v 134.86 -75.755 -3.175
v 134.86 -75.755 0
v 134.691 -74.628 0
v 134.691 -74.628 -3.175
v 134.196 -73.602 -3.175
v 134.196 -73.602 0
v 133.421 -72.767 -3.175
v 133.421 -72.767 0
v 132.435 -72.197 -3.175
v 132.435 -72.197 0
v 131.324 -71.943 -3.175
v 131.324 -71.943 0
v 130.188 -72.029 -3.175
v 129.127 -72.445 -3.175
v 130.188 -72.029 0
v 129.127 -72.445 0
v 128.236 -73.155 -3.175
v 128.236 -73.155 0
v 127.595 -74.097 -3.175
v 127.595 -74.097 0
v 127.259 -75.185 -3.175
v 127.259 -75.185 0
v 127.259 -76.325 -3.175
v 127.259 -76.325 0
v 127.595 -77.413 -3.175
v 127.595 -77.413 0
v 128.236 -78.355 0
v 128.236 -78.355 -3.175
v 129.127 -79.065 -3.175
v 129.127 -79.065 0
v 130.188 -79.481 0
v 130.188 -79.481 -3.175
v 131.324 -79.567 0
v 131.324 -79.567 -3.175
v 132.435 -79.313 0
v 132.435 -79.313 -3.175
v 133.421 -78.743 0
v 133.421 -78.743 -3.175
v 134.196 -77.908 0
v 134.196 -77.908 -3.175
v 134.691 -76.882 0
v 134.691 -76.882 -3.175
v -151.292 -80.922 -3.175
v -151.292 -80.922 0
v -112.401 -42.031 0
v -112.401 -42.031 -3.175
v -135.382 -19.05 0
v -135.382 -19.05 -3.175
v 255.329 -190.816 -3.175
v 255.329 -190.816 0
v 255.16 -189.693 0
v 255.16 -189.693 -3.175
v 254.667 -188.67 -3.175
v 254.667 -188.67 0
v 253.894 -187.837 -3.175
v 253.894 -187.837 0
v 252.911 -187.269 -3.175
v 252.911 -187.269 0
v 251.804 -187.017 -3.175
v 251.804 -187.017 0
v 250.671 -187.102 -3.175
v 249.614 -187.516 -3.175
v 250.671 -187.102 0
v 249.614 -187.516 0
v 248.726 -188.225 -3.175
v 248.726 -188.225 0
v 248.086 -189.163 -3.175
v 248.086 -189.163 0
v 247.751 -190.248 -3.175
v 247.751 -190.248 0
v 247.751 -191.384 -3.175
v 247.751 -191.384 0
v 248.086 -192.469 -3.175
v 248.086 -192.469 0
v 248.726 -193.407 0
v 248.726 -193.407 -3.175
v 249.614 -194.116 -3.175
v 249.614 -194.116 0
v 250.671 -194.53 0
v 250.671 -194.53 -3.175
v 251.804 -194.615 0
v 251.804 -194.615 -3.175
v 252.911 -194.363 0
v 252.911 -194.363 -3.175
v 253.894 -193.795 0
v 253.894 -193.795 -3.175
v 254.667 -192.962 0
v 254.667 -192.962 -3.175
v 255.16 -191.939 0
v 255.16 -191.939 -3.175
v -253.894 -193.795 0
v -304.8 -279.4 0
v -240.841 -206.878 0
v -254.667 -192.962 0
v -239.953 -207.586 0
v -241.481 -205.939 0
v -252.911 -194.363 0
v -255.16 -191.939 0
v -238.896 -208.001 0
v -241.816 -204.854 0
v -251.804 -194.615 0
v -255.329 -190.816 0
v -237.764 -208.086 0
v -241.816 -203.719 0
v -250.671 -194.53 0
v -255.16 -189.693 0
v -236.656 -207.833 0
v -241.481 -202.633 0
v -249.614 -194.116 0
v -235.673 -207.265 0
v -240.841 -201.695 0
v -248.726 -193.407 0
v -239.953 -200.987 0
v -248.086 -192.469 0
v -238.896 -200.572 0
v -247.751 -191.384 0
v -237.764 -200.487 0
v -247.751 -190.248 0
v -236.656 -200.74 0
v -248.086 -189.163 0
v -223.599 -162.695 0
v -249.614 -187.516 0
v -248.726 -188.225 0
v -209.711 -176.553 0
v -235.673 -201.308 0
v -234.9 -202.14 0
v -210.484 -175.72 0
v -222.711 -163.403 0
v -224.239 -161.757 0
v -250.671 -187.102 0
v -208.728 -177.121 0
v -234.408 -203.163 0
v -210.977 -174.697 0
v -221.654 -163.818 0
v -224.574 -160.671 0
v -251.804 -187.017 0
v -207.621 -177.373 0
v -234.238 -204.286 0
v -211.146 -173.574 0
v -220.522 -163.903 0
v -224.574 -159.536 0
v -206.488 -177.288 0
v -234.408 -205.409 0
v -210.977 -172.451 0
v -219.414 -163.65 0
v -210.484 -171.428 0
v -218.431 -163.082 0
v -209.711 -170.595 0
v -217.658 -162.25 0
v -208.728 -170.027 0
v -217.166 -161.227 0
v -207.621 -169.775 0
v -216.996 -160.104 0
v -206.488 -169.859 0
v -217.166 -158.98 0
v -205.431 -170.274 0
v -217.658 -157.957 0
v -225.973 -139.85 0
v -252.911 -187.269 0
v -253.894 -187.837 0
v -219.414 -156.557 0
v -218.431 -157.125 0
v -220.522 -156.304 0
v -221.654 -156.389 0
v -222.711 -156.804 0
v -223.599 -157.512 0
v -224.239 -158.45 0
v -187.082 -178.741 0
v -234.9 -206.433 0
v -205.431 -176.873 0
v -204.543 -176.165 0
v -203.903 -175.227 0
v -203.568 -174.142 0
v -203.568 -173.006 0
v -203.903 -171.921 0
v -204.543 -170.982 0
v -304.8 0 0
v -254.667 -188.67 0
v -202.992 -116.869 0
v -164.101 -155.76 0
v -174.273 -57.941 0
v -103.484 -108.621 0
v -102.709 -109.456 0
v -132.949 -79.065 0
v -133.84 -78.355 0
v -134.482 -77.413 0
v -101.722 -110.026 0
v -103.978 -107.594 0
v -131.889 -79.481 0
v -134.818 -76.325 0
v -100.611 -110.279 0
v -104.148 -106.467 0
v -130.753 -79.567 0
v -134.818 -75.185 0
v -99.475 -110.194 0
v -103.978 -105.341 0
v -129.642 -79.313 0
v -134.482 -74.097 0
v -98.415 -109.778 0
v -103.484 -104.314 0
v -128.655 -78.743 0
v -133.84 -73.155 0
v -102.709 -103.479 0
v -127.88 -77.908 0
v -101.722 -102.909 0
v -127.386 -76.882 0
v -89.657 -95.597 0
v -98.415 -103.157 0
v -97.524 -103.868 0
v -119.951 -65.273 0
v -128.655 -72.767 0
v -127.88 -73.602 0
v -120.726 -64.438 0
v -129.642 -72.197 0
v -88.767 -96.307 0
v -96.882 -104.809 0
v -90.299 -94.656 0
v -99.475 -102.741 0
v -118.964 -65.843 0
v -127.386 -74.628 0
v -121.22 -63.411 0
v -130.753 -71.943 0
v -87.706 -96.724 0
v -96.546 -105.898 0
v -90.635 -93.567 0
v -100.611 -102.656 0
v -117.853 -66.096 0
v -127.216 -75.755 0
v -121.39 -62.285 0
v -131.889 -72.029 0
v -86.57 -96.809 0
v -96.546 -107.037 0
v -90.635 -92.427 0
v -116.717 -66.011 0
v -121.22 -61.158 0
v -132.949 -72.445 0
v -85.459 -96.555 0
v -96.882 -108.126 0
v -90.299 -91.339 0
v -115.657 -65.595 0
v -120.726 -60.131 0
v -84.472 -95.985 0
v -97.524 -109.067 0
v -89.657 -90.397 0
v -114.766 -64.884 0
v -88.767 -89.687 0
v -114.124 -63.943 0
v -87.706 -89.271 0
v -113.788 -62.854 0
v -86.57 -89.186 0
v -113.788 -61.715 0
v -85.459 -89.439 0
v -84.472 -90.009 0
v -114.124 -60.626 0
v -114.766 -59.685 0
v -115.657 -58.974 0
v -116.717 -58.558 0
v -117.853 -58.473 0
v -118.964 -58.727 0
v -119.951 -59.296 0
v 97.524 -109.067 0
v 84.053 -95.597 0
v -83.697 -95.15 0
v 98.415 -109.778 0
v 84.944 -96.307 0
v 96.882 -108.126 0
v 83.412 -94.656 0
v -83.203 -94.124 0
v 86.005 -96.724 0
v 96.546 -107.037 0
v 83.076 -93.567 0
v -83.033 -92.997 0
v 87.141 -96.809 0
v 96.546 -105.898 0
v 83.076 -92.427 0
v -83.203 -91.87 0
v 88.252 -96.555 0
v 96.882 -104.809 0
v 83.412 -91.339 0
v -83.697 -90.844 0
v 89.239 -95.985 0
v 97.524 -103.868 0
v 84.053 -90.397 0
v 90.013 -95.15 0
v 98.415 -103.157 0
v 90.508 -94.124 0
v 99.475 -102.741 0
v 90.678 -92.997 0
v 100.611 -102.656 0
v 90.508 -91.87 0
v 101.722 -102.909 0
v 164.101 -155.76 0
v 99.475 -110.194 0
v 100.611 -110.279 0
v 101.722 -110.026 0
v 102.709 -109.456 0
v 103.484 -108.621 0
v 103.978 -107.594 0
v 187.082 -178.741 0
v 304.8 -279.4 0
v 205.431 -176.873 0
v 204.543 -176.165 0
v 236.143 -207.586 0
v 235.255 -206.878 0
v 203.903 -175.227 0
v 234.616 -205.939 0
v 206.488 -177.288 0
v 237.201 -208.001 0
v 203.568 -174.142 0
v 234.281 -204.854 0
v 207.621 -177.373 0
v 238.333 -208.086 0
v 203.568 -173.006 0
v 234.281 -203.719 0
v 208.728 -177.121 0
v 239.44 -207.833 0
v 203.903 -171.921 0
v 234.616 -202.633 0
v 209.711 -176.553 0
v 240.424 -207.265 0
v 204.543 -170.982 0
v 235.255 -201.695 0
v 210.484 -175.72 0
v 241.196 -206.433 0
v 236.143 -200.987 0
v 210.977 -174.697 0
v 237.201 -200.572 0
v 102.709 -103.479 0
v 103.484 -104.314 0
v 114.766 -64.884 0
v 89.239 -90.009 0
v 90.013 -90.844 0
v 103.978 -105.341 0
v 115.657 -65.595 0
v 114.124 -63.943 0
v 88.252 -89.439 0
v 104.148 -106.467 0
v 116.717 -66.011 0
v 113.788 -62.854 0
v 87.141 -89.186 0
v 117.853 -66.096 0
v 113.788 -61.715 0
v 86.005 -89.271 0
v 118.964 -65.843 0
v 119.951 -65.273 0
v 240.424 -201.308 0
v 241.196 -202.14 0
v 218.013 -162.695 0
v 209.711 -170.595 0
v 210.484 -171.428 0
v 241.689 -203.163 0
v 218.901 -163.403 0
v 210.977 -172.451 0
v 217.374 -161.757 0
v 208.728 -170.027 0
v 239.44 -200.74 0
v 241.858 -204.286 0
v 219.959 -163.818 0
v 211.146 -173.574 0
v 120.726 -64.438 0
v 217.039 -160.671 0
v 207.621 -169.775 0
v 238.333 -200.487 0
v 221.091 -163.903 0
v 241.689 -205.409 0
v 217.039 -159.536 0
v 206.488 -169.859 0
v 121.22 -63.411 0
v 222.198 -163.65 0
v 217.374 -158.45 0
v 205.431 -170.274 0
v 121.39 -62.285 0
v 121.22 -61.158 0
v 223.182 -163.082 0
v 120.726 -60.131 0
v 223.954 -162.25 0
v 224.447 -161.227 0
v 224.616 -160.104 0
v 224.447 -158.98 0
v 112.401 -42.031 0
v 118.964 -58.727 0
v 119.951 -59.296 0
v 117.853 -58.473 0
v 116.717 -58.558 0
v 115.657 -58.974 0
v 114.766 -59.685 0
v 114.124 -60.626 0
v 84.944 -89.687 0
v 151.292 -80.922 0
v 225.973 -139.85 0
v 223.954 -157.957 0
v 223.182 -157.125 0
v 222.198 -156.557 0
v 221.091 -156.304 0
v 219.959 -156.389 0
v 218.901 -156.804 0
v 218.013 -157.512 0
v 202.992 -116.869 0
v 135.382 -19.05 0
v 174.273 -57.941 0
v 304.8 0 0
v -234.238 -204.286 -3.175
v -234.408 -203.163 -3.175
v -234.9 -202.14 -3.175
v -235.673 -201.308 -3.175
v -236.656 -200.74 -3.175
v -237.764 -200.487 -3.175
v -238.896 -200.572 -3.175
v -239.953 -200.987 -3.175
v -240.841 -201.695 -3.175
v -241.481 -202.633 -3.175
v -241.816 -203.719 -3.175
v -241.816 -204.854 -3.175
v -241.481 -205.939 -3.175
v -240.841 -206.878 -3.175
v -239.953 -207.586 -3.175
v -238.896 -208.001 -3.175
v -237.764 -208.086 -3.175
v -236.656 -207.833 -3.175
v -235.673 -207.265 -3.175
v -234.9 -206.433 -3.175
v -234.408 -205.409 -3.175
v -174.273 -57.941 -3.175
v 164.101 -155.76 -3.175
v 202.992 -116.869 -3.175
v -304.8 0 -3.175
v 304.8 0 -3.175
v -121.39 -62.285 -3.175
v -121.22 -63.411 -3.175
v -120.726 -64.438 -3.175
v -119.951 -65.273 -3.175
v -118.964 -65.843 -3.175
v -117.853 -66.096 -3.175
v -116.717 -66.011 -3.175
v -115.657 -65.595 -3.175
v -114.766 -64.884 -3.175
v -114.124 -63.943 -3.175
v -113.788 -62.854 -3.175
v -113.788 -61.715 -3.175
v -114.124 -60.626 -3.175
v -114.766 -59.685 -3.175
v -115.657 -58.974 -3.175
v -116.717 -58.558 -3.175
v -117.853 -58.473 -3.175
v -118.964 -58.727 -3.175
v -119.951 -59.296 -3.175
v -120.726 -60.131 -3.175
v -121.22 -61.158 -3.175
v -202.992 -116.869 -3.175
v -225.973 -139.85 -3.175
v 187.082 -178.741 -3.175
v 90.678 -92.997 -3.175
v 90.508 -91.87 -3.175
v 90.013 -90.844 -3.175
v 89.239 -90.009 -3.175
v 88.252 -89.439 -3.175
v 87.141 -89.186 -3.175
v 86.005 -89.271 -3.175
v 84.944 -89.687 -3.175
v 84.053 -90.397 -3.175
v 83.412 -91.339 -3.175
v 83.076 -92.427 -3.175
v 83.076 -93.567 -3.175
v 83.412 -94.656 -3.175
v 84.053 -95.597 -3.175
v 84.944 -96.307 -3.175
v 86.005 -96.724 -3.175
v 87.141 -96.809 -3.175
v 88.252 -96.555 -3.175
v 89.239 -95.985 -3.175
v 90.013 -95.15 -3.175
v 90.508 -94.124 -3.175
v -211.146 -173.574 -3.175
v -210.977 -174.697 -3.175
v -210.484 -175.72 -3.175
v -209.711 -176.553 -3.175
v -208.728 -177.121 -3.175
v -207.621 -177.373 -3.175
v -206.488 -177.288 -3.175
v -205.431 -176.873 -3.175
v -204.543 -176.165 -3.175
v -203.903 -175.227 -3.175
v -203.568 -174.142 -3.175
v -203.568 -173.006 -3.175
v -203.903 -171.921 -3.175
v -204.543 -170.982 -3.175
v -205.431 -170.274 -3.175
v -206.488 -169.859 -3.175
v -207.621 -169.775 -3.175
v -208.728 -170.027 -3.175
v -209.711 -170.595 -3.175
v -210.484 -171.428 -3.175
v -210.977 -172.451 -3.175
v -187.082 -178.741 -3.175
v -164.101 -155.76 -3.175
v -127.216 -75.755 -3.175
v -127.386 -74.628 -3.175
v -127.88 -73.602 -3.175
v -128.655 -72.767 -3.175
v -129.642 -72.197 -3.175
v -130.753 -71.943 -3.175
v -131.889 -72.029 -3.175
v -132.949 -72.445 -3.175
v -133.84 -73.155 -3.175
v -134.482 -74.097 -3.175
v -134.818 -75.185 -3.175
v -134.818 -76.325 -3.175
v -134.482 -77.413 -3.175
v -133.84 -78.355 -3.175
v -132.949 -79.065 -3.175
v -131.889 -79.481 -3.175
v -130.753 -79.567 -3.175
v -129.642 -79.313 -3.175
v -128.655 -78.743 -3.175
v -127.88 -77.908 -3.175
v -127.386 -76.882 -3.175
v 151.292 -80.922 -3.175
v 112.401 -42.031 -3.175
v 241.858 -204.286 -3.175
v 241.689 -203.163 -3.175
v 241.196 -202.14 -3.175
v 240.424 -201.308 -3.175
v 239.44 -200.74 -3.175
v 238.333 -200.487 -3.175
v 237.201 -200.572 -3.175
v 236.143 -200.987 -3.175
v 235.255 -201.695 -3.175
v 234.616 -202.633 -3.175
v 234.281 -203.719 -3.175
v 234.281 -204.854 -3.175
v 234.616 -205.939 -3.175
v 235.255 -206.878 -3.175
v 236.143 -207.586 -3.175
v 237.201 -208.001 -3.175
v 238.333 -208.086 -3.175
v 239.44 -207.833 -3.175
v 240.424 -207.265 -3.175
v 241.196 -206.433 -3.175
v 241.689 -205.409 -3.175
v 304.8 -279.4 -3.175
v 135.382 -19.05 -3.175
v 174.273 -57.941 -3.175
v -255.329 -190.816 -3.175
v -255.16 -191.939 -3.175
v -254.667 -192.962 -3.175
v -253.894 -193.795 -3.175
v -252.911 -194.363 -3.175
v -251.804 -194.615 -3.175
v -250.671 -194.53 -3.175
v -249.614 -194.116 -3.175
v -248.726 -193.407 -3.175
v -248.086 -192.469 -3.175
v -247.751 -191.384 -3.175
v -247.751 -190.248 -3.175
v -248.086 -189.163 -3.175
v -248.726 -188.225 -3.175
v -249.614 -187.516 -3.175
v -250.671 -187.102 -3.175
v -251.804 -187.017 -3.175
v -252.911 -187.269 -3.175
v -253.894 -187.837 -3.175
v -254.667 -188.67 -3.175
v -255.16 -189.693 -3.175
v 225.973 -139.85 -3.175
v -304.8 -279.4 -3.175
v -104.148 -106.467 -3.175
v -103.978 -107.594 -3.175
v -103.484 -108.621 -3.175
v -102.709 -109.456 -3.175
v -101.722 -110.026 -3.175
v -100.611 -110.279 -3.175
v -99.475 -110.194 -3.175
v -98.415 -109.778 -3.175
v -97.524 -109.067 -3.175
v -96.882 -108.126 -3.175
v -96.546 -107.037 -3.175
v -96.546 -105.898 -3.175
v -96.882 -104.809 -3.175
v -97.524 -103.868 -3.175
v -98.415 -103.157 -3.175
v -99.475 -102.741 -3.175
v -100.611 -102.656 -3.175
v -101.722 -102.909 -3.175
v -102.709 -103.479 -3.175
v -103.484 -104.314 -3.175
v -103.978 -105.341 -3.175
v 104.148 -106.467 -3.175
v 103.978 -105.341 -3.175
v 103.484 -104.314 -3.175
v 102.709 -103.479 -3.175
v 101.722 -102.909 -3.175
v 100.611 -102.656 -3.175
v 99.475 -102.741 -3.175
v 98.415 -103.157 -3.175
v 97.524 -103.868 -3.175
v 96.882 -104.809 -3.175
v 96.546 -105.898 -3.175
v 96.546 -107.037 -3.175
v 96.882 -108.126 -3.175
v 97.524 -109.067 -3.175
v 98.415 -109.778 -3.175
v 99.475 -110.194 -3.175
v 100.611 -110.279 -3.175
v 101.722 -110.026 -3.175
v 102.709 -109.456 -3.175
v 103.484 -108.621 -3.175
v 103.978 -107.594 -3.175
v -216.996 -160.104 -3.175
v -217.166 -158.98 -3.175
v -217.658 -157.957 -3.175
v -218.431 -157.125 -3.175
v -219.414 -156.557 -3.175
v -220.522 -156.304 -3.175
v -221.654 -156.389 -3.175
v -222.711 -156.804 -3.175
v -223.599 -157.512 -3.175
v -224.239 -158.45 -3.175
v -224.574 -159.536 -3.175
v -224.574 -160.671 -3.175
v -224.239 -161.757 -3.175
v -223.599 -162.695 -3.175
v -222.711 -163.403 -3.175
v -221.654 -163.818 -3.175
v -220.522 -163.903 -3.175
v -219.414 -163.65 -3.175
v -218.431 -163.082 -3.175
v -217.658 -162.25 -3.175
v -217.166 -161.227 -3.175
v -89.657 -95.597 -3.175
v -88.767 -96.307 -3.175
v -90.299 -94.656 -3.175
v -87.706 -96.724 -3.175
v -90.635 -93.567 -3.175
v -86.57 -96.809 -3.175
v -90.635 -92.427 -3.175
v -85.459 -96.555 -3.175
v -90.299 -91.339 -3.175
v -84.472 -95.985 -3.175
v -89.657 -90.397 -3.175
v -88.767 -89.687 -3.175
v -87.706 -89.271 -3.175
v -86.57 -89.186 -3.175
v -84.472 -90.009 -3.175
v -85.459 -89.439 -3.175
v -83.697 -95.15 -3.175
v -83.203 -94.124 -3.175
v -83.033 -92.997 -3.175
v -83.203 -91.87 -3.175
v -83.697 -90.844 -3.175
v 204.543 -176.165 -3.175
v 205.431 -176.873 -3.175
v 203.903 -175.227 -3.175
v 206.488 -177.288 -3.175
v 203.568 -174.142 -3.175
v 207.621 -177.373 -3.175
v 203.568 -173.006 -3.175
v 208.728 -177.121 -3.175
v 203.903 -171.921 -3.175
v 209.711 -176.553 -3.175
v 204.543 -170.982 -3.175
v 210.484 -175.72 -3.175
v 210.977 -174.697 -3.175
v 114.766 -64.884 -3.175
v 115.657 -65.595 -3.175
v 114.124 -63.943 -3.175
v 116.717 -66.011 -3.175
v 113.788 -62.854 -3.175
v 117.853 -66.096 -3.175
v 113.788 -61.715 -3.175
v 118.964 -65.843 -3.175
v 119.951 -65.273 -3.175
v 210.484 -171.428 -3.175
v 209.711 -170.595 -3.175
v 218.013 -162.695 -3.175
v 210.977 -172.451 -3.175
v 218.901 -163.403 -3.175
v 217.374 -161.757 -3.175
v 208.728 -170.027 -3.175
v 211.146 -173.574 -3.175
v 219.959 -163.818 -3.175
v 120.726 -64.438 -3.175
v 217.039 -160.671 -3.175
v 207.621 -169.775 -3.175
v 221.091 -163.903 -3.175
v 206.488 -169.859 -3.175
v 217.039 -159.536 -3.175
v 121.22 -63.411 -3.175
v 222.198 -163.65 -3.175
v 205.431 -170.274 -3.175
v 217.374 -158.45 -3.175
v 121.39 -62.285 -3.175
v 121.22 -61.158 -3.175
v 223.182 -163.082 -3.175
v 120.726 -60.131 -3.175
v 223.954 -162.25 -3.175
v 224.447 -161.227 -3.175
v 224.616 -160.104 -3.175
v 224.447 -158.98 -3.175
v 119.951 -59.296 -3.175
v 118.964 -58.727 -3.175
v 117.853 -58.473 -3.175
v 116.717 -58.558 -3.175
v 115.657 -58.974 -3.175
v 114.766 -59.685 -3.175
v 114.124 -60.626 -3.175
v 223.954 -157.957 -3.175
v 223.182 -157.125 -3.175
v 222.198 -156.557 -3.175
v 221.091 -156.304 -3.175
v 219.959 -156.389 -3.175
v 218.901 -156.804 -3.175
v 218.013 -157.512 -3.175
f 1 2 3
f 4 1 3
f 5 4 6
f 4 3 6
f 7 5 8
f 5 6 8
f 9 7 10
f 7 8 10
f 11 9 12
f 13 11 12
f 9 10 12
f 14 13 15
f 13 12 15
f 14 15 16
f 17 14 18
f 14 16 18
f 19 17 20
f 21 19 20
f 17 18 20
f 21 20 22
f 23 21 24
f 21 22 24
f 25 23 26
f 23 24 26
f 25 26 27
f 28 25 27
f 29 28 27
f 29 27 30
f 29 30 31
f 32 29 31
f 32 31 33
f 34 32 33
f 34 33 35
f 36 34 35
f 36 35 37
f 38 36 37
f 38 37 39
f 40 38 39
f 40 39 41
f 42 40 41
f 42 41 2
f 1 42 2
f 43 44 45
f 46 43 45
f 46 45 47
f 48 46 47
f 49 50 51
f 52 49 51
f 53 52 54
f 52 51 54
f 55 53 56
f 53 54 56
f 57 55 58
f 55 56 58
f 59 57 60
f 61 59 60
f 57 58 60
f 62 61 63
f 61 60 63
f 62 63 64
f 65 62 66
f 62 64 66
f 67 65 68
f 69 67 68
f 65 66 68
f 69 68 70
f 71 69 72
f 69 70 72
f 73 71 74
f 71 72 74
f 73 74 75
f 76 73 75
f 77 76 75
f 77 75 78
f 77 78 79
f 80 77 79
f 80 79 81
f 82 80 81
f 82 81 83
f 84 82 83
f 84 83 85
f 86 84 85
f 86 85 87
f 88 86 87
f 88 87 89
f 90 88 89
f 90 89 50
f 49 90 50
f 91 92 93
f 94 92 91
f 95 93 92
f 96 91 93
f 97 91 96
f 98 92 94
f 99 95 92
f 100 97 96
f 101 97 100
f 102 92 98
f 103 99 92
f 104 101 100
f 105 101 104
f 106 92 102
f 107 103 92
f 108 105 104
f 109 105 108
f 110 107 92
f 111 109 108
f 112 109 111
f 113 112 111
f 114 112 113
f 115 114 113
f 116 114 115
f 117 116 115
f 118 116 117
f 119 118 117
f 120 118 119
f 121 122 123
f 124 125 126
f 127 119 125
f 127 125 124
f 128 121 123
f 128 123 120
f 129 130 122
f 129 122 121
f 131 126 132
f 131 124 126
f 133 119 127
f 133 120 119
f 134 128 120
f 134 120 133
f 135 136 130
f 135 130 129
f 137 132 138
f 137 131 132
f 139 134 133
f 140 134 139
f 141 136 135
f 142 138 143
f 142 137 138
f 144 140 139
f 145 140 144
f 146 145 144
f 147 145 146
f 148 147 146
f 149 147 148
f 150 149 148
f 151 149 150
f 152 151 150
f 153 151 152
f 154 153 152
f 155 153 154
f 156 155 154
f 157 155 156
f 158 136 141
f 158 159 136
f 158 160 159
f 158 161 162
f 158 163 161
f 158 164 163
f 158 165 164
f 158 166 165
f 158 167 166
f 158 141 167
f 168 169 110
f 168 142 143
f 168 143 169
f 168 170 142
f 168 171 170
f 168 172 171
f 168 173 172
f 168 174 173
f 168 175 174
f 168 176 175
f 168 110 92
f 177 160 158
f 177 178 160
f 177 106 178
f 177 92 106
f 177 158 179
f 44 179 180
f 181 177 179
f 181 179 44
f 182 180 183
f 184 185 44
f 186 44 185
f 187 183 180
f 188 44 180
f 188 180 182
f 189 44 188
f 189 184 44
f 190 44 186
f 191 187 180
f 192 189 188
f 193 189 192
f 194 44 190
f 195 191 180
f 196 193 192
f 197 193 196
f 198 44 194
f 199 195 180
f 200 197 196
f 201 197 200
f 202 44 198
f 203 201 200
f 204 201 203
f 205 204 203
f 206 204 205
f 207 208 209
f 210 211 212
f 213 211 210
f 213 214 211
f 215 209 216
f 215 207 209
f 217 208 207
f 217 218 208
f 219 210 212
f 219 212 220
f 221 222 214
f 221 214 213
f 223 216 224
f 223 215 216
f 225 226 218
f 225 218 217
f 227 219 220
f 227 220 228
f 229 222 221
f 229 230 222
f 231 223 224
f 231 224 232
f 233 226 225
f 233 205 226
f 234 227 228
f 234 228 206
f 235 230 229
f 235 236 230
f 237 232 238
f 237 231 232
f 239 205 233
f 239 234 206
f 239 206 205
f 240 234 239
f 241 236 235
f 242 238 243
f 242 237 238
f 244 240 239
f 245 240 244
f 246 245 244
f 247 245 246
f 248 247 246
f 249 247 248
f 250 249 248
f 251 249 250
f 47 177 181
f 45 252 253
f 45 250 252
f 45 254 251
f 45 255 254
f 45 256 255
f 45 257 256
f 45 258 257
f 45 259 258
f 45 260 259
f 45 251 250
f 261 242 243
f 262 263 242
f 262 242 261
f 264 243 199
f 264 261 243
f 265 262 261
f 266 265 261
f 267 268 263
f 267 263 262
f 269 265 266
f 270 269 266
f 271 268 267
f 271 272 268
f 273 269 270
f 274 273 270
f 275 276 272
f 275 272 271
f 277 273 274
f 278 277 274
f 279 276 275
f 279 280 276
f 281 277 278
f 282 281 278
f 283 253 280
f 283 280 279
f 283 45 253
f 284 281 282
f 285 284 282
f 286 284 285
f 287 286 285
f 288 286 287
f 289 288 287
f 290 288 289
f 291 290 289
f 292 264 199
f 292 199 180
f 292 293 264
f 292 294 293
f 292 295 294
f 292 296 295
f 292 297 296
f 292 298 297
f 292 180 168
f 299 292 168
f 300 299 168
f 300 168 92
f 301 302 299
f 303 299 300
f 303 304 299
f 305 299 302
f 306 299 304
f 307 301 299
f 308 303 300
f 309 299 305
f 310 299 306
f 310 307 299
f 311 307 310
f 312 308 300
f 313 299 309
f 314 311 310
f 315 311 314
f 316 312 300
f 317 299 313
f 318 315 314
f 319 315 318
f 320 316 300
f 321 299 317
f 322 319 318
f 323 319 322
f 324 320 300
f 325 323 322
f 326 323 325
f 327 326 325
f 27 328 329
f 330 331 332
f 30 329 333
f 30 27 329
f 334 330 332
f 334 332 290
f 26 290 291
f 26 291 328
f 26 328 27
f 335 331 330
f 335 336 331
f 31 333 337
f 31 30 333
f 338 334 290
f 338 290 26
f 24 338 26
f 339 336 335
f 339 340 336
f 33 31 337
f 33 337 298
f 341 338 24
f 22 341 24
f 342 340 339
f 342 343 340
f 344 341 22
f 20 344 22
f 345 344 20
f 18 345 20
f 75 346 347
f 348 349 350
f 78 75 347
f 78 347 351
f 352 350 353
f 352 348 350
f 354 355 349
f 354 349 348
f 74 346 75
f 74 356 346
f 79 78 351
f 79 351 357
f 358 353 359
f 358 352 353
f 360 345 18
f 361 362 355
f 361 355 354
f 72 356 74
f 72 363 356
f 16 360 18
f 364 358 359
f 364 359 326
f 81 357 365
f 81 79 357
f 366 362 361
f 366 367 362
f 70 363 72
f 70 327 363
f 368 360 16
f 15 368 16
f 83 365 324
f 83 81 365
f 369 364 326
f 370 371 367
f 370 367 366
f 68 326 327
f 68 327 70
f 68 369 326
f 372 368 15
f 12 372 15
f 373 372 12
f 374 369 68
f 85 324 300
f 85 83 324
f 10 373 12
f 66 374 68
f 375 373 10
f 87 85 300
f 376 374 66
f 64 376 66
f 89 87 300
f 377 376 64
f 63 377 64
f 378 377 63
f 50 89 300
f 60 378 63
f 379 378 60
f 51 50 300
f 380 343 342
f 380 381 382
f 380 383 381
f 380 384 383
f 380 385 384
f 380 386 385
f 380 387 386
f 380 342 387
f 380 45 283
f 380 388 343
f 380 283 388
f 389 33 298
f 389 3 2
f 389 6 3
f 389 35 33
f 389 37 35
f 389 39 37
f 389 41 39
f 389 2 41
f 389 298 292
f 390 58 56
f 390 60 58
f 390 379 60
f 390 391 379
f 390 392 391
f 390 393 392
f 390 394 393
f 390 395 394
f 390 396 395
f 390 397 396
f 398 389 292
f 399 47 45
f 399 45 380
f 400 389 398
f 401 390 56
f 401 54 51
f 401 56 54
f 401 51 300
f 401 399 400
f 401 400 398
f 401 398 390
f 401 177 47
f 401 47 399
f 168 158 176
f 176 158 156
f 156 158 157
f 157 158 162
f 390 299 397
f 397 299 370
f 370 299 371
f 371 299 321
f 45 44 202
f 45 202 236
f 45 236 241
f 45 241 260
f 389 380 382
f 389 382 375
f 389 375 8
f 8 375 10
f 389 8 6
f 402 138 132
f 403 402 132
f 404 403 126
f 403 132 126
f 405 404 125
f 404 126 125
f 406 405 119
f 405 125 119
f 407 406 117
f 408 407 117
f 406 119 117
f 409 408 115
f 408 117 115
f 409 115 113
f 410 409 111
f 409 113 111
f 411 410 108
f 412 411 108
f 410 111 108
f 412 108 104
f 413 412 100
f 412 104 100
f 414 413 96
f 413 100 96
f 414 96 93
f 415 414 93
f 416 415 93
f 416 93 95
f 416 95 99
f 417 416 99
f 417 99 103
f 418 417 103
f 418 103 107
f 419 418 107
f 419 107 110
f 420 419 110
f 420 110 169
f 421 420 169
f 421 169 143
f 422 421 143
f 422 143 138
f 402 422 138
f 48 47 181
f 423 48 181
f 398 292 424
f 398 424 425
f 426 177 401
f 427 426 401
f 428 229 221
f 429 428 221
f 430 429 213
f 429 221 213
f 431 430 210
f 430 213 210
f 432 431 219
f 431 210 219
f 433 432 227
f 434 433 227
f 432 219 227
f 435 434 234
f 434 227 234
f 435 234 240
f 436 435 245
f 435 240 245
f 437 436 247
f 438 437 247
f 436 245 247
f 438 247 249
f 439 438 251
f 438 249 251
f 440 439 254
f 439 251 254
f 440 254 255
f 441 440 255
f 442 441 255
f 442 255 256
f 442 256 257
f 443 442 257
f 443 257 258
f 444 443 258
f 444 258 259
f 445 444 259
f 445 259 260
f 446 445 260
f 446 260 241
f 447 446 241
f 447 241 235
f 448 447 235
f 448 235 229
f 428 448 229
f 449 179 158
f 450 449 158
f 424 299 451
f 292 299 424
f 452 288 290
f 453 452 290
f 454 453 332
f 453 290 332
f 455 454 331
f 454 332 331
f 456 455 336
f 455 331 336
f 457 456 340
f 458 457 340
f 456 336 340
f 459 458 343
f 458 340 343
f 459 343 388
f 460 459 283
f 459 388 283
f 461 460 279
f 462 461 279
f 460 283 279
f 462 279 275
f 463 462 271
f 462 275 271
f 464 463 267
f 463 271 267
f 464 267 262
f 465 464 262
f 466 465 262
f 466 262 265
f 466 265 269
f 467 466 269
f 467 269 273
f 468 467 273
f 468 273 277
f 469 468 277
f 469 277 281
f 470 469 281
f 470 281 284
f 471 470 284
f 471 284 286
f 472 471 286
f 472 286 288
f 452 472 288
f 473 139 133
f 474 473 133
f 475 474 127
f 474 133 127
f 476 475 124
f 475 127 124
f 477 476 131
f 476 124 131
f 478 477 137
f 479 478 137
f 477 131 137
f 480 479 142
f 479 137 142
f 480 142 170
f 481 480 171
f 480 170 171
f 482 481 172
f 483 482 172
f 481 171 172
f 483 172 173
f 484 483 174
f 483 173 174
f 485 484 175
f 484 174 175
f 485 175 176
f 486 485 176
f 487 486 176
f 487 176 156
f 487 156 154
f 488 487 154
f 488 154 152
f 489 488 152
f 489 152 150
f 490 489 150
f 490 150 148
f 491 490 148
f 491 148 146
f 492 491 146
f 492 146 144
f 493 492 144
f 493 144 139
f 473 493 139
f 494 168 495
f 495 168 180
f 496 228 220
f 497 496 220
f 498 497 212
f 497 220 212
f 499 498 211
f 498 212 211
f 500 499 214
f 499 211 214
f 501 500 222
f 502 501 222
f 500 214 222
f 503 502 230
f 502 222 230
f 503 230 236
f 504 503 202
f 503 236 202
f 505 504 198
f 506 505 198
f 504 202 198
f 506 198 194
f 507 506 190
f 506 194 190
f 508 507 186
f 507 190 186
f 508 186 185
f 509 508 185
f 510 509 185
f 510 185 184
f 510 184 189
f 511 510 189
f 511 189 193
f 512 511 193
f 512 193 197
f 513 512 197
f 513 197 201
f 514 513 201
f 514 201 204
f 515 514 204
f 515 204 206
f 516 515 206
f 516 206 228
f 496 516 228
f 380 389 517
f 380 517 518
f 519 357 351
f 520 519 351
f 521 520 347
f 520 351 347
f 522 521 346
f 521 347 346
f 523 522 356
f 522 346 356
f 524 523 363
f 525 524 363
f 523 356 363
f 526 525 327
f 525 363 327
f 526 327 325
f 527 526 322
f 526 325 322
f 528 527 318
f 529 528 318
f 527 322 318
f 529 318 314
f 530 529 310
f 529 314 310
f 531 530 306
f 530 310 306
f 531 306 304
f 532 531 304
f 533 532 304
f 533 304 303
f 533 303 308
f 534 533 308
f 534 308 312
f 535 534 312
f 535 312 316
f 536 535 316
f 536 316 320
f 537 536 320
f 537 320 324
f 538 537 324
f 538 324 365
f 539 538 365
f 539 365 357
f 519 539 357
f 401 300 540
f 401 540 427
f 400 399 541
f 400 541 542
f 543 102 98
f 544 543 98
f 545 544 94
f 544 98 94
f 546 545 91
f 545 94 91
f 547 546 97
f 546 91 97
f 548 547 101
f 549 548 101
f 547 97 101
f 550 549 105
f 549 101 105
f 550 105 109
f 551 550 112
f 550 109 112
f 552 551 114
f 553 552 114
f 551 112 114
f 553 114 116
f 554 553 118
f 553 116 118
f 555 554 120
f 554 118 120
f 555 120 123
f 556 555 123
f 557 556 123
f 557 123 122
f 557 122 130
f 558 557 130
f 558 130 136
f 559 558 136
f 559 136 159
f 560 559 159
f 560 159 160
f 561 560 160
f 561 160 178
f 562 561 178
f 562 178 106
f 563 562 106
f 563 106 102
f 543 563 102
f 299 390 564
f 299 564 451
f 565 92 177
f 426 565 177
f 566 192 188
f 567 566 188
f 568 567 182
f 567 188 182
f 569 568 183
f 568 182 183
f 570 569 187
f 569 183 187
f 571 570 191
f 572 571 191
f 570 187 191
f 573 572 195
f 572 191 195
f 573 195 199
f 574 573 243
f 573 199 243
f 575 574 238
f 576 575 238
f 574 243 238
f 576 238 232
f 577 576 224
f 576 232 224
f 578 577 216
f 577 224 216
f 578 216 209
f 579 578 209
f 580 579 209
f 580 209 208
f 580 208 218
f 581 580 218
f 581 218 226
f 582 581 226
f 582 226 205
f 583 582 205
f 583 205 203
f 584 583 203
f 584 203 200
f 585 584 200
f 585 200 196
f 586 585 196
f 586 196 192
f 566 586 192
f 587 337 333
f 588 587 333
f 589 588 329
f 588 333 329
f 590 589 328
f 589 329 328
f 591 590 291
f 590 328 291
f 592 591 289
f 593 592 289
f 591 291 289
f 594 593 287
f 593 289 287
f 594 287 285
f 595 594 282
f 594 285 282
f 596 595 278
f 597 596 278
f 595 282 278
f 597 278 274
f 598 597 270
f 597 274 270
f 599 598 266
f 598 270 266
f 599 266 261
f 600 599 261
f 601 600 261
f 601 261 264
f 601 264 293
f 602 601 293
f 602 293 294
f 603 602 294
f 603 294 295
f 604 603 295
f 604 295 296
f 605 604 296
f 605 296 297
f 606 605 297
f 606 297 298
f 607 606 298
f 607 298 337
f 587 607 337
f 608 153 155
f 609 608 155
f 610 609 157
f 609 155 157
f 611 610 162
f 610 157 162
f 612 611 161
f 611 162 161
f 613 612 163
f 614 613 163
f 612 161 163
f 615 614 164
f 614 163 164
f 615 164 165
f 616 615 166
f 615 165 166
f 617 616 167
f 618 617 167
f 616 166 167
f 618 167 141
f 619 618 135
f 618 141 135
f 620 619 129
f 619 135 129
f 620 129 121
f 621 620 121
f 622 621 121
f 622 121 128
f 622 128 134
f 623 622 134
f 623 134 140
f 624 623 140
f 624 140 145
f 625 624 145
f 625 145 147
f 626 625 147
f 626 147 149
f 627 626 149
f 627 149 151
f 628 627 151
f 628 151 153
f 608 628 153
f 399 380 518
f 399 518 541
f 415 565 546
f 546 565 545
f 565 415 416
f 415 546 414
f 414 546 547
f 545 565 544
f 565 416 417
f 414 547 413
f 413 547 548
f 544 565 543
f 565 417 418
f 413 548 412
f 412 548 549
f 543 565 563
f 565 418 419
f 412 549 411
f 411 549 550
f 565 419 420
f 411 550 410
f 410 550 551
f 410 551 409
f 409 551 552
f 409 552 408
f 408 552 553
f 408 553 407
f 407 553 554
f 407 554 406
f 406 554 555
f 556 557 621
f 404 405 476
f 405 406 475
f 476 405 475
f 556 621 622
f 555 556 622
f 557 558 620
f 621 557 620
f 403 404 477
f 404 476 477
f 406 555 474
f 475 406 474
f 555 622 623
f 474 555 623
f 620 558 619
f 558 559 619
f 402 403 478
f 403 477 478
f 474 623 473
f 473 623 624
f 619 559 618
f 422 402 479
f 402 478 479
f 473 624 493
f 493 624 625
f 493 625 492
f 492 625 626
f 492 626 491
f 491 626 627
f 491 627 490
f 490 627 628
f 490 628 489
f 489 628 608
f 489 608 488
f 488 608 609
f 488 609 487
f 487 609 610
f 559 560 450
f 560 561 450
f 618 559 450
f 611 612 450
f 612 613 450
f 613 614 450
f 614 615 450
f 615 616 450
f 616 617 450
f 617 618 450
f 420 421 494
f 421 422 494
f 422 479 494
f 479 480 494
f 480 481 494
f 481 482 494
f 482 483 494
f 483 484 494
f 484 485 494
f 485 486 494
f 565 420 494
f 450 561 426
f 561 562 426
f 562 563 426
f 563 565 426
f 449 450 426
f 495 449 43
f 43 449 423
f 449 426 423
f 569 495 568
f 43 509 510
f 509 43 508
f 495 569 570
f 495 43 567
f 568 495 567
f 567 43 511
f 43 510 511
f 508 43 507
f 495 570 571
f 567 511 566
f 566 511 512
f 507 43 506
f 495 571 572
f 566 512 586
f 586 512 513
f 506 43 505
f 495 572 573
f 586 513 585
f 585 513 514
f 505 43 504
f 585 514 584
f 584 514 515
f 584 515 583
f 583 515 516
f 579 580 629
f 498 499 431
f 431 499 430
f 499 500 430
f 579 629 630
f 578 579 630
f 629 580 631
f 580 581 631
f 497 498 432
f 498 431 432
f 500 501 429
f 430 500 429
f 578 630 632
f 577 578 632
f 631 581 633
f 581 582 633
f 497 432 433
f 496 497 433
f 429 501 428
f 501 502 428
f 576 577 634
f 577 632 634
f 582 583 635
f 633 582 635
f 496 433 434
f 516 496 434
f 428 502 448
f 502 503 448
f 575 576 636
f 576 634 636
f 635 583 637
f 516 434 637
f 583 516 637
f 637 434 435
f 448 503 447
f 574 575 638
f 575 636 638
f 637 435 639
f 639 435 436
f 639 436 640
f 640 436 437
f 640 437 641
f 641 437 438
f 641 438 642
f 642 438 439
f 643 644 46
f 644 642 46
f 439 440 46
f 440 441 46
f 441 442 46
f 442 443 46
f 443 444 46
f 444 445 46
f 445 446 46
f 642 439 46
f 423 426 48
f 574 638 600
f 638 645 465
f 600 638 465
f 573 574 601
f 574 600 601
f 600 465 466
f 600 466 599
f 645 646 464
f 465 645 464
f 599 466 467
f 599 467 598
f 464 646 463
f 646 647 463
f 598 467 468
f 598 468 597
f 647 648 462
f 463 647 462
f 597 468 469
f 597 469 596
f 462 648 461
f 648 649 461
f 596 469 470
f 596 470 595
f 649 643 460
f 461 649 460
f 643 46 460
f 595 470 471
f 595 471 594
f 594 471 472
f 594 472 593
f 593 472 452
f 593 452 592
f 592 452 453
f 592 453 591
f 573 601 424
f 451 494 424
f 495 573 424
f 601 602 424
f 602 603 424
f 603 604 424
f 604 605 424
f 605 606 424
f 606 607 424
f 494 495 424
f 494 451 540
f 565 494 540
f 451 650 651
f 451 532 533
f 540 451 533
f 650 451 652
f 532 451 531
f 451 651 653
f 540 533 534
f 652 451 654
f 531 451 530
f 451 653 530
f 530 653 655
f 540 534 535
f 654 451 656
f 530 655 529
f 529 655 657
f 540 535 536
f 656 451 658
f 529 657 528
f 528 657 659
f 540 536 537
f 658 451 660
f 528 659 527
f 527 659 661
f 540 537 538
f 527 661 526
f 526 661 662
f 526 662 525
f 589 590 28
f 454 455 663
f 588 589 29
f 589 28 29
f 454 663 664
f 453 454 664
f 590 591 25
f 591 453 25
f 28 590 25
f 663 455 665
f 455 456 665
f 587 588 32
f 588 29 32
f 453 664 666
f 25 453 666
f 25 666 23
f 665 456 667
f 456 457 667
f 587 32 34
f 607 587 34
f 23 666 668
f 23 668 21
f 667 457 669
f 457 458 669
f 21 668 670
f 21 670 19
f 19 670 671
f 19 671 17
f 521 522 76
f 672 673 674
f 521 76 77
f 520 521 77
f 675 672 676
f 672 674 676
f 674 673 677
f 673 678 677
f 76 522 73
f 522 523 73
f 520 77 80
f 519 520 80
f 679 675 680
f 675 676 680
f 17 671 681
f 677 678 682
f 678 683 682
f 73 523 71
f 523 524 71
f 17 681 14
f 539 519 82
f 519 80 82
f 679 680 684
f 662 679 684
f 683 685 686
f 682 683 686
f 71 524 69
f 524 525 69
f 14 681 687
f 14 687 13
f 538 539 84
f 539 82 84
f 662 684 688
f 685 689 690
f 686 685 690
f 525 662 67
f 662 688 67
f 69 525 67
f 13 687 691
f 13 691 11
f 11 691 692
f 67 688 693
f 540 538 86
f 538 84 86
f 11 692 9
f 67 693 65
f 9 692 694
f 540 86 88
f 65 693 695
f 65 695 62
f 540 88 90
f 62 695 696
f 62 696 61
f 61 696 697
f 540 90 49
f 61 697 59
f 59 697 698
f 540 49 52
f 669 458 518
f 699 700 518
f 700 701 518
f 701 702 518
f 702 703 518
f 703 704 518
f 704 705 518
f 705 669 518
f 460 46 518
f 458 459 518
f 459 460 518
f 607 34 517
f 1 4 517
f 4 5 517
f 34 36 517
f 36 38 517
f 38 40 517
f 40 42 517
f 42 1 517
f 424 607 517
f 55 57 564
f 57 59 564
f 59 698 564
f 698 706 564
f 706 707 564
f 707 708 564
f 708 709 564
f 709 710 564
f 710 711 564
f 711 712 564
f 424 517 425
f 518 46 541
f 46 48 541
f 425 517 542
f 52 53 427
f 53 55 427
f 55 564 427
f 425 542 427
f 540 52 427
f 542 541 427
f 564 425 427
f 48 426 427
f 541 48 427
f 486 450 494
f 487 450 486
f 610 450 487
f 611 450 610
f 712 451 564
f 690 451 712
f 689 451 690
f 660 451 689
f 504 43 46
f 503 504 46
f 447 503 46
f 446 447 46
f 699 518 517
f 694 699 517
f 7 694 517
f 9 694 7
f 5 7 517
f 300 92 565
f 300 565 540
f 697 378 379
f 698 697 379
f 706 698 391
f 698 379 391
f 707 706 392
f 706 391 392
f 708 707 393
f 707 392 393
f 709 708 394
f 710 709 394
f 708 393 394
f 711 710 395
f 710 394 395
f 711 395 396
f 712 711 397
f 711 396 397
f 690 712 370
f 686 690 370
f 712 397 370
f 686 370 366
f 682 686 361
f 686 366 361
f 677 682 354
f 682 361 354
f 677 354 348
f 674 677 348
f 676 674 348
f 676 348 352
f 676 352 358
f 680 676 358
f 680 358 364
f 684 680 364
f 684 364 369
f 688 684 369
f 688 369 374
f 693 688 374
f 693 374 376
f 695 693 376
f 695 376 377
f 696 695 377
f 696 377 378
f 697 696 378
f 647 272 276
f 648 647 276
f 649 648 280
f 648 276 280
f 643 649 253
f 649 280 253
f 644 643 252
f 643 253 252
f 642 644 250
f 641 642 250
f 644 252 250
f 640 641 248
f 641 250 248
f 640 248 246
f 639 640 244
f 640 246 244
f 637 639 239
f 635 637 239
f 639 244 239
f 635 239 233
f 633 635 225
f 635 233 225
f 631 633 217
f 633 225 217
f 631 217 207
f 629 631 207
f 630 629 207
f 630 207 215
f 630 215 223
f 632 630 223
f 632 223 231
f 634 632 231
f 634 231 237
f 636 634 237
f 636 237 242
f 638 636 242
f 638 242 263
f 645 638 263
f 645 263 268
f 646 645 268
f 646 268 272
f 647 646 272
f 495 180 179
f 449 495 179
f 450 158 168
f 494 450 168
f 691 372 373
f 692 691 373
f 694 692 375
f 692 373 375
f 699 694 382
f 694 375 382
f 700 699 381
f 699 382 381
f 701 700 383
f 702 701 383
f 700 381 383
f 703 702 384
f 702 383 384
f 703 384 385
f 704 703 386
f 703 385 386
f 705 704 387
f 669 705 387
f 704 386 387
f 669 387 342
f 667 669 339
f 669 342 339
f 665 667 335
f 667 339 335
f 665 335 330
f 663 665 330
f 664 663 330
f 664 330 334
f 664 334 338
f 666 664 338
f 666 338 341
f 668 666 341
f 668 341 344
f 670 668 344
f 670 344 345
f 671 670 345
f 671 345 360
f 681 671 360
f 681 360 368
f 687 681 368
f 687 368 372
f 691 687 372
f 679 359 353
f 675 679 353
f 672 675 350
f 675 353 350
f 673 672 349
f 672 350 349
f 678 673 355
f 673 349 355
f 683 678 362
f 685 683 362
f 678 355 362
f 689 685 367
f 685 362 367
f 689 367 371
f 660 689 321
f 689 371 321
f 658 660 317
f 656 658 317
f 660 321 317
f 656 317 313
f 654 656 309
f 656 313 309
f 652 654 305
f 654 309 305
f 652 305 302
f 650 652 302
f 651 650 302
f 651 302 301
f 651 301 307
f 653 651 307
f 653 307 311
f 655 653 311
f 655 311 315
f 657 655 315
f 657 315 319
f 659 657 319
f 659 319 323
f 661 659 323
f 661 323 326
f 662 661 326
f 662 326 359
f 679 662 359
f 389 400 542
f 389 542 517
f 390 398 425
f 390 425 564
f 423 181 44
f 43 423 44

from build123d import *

# Parameters (mm, degrees)
SKETCH1_W           = 609.6
SKETCH1_H           = 279.4
BOSS_EXTRUDE1_DEPTH = 3.175
SKETCH1_9_R         = 3.81
SKETCH1_9_R_2       = 3.822247212
CUT_EXTRUDE1_DEPTH  = 414.49423288
SKETCH1_10_R        = 3.822247212
SKETCH1_10_R_2      = 3.81
CUT_EXTRUDE2_DEPTH  = 414.49423288


with BuildPart() as part:
    # Sketch1 → Boss-Extrude1 (new body)
    with BuildSketch(Plane.XY):
        with Locations((0, -139.7)):
            Rectangle(SKETCH1_W, SKETCH1_H)
    extrude(amount=-BOSS_EXTRUDE1_DEPTH)

    # Sketch1<9> → Cut-Extrude1 (cut, through all)
    with BuildSketch(Plane.XY):
        with Locations((-220.806313845, -160.103502887)):
            Circle(SKETCH1_9_R)
        with Locations((-207.335929664, -173.573887069)):
            Circle(SKETCH1_9_R)
        with Locations((-238.048405598, -204.286363003)):
            Circle(SKETCH1_9_R)
        with Locations((-251.518789779, -190.815978821)):
            Circle(SKETCH1_9_R)
        with Locations((-131.038243043, -75.755014104)):
            Circle(SKETCH1_9_R_2)
        with Locations((-117.567858862, -62.284629922)):
            Circle(SKETCH1_9_R_2)
        with Locations((-86.855382928, -92.997105856)):
            Circle(SKETCH1_9_R_2)
        with Locations((-100.325767109, -106.467490038)):
            Circle(SKETCH1_9_R_2)
        Polygon((-112.401029611, -42.030970389), (-135.382, -19.05), (-174.272872965, -57.940872965), (-151.291902577, -80.921843354), align=None)
        Polygon((-202.992172707, -116.868872965), (-225.973143095, -139.849843354), (-187.08227013, -178.740716319), (-164.101299742, -155.759745931), align=None)
        Polygon((187.08227013, -178.740716319), (225.973143095, -139.849843354), (202.992172707, -116.868872965), (164.101299742, -155.759745931), align=None)
        Polygon((174.272872965, -57.940872965), (135.382, -19.05), (112.401029611, -42.030970389), (151.291902577, -80.921843354), align=None)
    extrude(amount=-CUT_EXTRUDE1_DEPTH, mode=Mode.SUBTRACT)

    # Sketch1<10> → Cut-Extrude2 (cut, through all)
    with BuildSketch(Plane.XY):
        with Locations((100.325767109, -106.467490038)):
            Circle(SKETCH1_10_R)
        with Locations((86.855382928, -92.997105856)):
            Circle(SKETCH1_10_R)
        with Locations((117.567858862, -62.284629922)):
            Circle(SKETCH1_10_R)
        with Locations((131.038243043, -75.755014104)):
            Circle(SKETCH1_10_R)
        with Locations((251.518789779, -190.815978821)):
            Circle(SKETCH1_10_R_2)
        with Locations((238.048405598, -204.286363003)):
            Circle(SKETCH1_10_R_2)
        with Locations((207.335929664, -173.573887069)):
            Circle(SKETCH1_10_R_2)
        with Locations((220.806313845, -160.103502887)):
            Circle(SKETCH1_10_R_2)
    extrude(amount=-CUT_EXTRUDE2_DEPTH, mode=Mode.SUBTRACT)


solid = part.part
